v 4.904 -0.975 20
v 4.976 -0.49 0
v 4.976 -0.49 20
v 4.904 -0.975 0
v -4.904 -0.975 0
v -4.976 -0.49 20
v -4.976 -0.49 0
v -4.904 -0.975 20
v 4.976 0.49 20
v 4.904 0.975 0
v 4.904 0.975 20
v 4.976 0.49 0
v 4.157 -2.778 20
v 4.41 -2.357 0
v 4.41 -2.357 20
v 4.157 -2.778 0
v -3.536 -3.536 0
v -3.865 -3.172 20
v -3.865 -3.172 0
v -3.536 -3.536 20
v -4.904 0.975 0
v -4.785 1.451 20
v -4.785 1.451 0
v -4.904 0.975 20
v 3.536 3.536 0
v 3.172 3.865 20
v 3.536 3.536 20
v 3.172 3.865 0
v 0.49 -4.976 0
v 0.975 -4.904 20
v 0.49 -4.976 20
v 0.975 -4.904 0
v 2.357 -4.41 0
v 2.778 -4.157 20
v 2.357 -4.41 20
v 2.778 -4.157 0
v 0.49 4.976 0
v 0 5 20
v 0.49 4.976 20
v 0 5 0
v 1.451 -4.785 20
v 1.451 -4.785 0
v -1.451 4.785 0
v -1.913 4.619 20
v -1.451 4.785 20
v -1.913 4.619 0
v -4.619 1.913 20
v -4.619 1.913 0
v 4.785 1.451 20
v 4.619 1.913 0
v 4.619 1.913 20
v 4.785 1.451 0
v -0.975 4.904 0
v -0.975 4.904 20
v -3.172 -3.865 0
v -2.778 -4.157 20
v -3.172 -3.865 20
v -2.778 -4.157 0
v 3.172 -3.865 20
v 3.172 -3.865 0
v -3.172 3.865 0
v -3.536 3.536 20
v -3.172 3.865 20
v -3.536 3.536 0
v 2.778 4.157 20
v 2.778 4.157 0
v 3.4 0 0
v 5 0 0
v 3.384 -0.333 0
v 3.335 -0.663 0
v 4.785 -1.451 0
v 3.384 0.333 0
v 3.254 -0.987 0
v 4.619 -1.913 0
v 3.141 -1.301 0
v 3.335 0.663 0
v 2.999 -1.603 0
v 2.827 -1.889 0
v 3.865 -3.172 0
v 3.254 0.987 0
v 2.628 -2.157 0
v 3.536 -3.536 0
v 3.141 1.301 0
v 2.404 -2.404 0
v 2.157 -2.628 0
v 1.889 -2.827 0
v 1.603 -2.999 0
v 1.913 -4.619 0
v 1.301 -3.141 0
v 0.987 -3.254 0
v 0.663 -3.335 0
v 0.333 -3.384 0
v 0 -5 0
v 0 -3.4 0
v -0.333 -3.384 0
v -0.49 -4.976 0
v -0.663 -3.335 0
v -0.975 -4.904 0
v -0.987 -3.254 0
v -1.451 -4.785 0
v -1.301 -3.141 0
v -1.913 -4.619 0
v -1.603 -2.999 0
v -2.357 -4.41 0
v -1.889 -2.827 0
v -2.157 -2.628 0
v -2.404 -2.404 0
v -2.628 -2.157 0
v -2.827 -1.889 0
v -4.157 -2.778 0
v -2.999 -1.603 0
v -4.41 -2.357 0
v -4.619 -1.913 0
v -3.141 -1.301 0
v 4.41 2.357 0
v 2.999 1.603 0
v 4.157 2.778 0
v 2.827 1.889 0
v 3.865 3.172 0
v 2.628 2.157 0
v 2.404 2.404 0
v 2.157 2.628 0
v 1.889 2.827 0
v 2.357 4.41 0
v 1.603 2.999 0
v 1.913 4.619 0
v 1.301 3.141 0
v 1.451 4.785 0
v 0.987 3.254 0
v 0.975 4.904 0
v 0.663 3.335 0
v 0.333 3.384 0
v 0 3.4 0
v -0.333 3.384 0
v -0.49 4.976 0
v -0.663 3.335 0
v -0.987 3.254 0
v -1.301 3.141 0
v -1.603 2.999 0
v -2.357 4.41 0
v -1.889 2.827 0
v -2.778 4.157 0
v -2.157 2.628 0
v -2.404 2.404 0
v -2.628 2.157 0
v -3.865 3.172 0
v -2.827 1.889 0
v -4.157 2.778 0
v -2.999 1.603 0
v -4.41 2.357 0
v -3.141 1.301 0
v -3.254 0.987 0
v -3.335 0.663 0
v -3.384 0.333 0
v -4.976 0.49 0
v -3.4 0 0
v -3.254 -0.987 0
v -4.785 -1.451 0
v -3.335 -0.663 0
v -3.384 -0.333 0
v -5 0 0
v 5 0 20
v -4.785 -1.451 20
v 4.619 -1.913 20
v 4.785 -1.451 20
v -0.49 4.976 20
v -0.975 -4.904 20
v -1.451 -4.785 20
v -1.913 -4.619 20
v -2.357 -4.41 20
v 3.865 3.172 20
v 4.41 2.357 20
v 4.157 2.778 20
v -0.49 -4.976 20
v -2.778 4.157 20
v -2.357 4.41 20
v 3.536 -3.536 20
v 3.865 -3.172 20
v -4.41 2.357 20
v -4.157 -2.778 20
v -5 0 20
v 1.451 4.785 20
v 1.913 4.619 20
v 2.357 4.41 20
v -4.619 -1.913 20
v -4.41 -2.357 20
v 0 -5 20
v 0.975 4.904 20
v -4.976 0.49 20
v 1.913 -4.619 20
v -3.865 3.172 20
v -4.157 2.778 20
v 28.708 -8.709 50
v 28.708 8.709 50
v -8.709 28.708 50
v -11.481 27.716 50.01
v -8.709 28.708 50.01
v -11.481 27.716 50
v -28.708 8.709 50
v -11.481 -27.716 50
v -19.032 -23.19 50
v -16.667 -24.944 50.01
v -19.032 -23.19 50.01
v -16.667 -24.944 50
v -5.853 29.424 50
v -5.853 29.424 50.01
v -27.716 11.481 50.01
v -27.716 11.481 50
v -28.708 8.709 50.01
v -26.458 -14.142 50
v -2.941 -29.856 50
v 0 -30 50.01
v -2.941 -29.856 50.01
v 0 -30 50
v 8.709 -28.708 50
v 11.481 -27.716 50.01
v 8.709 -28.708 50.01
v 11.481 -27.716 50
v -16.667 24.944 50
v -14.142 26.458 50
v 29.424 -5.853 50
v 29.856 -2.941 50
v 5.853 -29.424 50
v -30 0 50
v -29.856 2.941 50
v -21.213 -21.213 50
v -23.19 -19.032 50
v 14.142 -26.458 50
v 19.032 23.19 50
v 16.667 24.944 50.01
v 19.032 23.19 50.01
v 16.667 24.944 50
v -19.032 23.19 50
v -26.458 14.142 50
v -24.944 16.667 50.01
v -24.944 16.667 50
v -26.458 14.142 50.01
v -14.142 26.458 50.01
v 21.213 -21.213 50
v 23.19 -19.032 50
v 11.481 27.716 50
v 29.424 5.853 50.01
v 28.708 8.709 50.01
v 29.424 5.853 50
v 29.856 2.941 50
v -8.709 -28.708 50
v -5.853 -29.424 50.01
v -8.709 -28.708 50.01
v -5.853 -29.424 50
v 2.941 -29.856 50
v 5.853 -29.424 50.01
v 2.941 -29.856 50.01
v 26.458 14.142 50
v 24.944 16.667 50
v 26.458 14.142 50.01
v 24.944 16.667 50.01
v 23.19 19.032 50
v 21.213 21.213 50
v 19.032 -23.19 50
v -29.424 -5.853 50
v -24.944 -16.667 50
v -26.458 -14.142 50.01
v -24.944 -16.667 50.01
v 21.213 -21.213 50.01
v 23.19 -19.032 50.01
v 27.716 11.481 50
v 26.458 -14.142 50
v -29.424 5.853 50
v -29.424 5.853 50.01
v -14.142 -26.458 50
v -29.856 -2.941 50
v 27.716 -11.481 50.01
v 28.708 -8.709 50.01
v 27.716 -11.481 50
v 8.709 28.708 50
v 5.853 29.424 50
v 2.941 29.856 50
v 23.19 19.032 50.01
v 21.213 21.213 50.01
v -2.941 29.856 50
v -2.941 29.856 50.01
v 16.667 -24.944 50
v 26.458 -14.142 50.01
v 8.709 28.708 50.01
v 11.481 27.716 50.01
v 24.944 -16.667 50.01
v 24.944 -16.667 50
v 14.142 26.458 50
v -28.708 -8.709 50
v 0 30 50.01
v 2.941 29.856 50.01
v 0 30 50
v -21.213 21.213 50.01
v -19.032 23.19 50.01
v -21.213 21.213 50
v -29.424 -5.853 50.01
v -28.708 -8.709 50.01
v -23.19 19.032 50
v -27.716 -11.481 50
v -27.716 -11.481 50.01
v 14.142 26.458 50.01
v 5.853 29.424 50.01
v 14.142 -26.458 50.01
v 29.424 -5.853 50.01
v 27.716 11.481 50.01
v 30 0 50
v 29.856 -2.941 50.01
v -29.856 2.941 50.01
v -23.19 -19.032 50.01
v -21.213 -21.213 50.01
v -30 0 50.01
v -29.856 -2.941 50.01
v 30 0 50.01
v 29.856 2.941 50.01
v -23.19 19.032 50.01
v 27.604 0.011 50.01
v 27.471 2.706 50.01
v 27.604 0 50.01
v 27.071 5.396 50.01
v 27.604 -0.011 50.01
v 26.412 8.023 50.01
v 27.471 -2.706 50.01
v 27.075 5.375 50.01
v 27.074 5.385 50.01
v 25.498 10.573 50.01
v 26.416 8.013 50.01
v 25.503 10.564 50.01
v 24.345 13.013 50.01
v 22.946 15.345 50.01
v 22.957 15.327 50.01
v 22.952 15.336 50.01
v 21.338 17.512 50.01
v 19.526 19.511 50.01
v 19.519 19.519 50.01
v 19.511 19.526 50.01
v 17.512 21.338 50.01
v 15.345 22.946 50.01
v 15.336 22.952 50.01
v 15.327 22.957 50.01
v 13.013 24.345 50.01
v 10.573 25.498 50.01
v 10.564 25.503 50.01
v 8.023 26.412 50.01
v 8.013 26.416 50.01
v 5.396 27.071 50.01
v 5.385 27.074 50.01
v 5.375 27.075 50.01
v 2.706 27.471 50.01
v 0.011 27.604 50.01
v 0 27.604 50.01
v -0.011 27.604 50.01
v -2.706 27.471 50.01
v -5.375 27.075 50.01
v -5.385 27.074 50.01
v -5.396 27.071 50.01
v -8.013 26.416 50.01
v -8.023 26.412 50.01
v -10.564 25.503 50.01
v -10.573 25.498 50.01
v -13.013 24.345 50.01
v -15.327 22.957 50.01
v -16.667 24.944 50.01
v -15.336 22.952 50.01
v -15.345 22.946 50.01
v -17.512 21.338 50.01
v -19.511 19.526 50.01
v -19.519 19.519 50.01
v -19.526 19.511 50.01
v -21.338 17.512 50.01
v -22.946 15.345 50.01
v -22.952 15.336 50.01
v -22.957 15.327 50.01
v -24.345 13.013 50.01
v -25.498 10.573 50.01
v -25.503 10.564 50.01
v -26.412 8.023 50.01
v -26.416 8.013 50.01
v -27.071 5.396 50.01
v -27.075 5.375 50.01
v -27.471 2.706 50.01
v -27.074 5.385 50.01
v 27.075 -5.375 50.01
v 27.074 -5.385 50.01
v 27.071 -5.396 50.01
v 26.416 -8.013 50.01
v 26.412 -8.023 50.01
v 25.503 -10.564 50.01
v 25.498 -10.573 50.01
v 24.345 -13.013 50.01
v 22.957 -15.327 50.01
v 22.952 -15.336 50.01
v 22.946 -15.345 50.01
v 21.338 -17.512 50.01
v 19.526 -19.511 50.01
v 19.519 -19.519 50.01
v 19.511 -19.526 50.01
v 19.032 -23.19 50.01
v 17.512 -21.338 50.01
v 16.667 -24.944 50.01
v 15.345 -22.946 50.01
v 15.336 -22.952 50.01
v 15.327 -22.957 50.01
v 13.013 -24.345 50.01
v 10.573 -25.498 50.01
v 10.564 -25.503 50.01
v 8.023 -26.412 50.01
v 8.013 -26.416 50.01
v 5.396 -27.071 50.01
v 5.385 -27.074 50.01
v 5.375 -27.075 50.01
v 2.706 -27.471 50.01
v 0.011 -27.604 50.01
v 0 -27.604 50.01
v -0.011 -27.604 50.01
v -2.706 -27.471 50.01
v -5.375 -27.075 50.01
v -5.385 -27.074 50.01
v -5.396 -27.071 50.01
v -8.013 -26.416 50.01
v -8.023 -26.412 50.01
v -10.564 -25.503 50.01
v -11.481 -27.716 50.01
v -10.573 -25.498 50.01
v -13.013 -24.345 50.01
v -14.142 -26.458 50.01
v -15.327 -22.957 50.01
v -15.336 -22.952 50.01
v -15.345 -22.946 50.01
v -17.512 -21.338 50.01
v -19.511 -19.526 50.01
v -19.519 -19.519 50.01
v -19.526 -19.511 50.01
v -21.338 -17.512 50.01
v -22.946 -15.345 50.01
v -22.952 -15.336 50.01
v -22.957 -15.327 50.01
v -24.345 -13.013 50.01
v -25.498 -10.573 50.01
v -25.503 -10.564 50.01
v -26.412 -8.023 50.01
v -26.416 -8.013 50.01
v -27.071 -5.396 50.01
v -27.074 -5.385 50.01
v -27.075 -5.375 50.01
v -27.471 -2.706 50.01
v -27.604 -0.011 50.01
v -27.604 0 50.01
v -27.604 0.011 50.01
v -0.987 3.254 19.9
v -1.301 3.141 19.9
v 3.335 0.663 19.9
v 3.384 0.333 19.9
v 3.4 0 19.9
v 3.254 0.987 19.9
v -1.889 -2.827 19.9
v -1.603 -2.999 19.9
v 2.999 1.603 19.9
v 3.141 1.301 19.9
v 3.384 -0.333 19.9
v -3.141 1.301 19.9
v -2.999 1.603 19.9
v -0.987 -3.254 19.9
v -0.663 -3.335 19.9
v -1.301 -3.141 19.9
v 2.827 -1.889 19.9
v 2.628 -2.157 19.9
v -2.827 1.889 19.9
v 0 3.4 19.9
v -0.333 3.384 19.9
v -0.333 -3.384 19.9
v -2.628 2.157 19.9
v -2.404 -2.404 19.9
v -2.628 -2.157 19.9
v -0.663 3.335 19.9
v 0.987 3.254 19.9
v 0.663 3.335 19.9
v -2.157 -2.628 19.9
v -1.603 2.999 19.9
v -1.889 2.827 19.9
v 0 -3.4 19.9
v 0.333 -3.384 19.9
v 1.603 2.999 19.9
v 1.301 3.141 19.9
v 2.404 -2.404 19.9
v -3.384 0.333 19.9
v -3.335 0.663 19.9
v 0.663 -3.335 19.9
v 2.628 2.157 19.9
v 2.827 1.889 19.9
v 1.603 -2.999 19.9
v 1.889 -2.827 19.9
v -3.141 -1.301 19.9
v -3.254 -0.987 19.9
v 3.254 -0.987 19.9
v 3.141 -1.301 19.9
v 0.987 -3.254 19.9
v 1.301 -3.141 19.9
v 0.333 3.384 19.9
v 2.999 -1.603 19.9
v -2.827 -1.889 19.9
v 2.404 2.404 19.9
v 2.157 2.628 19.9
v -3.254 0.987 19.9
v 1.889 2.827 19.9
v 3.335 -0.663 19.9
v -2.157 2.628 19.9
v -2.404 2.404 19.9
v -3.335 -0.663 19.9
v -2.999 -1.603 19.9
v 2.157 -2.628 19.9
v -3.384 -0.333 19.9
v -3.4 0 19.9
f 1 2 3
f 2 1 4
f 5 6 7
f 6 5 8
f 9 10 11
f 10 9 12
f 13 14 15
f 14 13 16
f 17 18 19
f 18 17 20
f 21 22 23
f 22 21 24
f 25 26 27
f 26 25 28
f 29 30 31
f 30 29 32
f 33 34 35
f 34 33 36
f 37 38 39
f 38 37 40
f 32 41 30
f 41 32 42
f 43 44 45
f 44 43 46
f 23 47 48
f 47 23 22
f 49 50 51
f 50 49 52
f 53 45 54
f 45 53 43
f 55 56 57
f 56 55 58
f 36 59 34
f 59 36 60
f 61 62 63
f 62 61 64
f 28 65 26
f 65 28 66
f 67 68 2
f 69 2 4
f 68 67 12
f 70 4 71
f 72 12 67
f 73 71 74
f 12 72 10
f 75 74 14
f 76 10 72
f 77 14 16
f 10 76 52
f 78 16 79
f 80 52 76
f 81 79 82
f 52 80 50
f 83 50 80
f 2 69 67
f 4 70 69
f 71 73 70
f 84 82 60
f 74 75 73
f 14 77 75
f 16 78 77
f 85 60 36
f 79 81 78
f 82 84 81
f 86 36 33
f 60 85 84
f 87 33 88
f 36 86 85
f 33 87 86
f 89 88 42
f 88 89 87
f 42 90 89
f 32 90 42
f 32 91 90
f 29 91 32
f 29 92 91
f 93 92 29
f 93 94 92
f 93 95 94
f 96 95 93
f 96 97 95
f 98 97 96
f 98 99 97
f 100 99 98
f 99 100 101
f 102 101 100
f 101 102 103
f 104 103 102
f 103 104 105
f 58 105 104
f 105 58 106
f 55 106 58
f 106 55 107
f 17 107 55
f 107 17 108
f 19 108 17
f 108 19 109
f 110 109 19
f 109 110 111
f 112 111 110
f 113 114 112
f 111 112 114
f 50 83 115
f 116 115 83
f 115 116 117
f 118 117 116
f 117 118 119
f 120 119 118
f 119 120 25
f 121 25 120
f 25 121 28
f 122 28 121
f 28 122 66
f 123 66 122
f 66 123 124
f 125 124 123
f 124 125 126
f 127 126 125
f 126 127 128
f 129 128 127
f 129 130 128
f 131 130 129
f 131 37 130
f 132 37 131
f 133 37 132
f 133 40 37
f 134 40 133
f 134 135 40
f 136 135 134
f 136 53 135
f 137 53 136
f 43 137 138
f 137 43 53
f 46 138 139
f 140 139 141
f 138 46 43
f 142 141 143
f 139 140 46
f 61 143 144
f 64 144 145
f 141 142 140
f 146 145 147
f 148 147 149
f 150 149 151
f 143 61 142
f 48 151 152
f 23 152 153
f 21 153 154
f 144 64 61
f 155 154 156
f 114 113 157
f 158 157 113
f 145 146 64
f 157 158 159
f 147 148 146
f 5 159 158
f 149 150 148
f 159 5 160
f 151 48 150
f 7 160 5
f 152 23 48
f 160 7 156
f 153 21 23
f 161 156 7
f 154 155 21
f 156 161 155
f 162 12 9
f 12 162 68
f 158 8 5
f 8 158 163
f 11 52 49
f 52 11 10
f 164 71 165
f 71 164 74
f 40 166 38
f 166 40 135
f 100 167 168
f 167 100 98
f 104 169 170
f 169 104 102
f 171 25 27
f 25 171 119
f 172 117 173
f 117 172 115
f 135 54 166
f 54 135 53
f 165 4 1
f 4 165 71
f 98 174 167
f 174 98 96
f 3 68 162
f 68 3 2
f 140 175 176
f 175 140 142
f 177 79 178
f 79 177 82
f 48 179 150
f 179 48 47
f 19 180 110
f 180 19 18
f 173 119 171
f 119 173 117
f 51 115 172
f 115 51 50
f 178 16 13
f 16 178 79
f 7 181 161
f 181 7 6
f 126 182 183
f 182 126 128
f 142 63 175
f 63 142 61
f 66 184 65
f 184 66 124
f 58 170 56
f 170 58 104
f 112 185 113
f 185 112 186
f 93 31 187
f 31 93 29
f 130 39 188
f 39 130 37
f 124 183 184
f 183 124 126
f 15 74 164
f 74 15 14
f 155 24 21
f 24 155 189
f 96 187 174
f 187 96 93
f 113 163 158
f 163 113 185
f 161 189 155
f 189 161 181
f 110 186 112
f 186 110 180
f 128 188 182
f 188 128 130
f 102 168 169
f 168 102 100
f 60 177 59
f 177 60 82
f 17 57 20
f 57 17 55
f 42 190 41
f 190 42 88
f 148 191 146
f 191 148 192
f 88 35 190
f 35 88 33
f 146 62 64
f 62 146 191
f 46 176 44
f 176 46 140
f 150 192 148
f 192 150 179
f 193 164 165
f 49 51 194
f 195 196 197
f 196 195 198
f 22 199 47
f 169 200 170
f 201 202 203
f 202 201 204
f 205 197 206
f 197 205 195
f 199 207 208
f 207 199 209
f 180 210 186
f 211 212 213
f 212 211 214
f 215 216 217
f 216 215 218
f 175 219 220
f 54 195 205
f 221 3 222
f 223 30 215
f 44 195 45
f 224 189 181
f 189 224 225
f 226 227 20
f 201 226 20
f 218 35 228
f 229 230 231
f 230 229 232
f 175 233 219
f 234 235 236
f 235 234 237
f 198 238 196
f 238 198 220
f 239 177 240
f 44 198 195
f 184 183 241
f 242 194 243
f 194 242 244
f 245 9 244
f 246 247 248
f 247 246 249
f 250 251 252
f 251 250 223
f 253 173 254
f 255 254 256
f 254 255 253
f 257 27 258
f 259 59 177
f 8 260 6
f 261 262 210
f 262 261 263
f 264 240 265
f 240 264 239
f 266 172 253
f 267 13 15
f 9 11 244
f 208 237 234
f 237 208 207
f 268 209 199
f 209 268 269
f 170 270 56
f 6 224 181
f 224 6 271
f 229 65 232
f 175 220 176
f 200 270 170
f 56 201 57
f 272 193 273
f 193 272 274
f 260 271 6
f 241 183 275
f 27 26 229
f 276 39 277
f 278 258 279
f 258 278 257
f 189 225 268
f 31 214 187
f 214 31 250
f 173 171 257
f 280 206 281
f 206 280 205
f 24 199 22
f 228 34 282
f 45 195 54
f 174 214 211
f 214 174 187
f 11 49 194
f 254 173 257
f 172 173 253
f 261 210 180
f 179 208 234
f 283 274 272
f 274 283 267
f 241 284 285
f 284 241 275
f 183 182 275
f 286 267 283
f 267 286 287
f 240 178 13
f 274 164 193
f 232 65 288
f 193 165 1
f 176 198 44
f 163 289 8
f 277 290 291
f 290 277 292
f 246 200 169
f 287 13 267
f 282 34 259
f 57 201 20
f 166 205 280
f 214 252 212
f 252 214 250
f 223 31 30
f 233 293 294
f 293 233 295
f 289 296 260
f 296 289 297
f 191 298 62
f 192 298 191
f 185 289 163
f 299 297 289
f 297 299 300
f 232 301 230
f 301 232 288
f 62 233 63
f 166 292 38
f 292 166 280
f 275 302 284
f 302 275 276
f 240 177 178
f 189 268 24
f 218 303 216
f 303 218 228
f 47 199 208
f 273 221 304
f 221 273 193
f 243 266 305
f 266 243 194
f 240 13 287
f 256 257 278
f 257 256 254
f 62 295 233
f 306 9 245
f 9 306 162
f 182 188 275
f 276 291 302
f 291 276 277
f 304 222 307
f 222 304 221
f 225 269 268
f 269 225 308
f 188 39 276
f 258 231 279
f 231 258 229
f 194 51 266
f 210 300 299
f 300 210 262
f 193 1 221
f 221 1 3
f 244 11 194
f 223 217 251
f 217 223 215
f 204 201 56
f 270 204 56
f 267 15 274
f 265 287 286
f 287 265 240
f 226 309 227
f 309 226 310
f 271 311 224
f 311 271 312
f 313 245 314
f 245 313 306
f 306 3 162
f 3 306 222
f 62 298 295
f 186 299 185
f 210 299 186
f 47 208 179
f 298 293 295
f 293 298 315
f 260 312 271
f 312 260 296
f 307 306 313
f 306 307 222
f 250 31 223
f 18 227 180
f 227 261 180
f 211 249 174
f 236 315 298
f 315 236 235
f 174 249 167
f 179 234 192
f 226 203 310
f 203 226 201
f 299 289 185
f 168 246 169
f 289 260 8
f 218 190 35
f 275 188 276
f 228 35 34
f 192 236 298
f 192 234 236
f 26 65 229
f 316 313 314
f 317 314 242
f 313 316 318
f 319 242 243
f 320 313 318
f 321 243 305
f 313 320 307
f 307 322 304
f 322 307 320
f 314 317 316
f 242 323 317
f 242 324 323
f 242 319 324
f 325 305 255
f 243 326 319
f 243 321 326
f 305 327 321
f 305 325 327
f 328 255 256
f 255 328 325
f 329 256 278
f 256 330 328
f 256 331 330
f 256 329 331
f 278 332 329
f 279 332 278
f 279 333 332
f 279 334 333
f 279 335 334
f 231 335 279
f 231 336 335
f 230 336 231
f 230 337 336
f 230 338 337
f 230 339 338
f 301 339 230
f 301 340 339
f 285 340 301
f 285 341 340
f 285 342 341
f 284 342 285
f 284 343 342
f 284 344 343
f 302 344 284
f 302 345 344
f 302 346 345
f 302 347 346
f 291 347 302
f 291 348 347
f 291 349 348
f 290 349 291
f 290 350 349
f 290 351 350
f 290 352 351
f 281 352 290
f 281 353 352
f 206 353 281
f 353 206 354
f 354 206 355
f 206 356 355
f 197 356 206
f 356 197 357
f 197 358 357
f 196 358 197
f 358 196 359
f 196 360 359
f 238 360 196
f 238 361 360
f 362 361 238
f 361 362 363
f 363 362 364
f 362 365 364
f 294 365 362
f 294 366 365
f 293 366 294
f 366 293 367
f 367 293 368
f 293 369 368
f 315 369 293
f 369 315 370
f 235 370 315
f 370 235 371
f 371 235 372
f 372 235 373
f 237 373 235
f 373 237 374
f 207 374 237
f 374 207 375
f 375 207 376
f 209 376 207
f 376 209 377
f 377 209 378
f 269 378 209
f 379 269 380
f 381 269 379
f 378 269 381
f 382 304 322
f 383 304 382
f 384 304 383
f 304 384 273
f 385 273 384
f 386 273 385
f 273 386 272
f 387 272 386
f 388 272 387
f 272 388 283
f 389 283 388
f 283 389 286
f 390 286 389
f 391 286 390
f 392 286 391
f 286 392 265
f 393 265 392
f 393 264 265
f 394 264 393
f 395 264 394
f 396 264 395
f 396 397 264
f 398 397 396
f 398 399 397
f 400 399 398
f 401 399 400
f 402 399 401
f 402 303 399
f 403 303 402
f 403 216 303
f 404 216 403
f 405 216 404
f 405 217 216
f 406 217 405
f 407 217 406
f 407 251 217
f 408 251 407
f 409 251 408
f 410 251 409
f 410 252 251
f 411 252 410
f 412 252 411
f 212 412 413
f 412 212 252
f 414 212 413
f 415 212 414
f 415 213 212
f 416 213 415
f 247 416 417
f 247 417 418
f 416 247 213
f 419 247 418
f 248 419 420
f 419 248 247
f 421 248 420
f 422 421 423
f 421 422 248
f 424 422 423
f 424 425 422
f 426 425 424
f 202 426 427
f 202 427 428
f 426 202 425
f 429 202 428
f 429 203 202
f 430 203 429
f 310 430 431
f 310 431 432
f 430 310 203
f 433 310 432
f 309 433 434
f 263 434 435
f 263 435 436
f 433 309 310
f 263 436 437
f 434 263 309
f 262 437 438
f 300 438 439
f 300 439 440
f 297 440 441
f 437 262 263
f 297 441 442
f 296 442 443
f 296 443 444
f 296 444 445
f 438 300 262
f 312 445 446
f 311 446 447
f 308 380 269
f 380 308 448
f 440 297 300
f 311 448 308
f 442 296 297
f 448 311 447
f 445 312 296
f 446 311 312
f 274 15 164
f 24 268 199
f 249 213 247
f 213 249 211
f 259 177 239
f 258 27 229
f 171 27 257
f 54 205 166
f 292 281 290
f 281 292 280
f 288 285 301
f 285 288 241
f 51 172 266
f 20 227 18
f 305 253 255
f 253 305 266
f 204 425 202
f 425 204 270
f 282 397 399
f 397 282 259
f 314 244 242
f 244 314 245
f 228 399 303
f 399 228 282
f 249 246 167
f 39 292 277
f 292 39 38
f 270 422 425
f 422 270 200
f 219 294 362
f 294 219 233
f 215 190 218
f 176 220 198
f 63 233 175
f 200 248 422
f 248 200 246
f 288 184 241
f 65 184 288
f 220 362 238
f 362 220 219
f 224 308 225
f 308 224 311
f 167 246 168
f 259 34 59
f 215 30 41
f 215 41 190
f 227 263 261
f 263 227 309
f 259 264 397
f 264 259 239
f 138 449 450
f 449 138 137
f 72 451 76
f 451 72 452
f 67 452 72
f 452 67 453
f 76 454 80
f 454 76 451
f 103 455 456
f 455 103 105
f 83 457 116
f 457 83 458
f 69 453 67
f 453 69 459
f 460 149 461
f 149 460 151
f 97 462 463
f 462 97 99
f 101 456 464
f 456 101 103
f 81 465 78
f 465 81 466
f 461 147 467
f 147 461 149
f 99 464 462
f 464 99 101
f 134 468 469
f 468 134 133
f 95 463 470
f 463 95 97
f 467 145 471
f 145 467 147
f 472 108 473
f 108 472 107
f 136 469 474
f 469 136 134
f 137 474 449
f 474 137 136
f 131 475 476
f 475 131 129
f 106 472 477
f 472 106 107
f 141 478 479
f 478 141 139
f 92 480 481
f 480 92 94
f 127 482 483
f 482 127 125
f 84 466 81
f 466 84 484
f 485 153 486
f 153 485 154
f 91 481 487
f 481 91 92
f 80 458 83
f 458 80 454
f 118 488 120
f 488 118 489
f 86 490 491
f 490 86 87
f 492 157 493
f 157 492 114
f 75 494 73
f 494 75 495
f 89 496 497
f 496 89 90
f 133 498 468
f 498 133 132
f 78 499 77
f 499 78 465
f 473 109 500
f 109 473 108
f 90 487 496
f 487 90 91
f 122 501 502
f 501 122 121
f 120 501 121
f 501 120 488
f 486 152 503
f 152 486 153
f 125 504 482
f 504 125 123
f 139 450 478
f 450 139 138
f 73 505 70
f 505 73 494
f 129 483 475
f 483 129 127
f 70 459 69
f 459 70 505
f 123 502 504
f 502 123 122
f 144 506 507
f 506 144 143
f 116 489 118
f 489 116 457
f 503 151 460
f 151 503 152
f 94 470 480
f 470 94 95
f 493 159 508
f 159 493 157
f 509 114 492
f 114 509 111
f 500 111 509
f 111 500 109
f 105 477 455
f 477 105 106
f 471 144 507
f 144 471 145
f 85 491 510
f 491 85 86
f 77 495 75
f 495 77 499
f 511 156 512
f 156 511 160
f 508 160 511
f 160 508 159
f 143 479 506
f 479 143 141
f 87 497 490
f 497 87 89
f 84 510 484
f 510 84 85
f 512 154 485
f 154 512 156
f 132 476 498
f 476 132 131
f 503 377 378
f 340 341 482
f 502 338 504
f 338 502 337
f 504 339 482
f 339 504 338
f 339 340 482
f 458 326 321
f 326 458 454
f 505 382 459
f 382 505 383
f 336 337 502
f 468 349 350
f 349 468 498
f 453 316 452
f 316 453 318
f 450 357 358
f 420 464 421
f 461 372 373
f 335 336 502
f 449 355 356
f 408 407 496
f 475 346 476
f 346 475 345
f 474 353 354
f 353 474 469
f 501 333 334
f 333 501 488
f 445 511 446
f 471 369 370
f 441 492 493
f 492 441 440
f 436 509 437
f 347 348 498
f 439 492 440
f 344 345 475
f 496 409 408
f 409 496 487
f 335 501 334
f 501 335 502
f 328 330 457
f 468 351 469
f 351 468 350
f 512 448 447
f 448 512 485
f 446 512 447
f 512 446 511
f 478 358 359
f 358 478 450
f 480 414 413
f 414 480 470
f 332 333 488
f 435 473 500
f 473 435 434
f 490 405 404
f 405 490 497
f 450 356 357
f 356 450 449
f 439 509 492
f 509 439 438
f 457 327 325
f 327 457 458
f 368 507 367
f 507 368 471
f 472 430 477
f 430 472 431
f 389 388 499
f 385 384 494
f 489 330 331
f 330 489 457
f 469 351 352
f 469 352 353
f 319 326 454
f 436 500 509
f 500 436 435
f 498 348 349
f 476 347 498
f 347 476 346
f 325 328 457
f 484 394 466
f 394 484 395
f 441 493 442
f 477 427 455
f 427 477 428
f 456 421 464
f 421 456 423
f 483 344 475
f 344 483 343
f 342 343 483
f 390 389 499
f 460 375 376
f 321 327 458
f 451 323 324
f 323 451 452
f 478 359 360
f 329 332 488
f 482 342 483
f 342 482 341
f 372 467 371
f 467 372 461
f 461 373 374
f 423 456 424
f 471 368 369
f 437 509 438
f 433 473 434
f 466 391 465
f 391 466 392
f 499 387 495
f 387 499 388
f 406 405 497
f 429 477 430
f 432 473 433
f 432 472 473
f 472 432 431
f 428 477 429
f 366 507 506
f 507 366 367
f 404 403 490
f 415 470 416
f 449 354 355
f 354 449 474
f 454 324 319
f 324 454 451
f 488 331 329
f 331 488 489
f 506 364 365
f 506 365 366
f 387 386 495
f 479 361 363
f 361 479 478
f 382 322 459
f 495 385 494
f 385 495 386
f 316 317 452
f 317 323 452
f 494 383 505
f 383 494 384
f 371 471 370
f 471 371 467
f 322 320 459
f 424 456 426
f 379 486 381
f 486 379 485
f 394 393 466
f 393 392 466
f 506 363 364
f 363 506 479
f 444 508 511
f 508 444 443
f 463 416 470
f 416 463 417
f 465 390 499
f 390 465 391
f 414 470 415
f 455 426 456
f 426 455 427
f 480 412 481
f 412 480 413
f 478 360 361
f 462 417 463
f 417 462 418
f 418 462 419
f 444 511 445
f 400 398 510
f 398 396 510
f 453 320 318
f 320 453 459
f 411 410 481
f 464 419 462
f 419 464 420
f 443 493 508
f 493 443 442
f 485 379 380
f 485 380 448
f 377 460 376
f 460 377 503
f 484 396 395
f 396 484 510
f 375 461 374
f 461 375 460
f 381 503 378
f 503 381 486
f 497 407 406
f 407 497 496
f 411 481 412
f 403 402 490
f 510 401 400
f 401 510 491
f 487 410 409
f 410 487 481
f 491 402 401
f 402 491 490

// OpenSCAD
// --- Dimensions (mm) ---
spout_od = 10.0;          // Outer diameter of the spout
spout_height = 20.0;      // Height of the spout from the base
funnel_rim_od = 60.0;     // Outer diameter at the top rim
funnel_height = 50.0;     // Total height from base to rim
wall_thickness = 1.6;     // Constant wall thickness (measured horizontally/radially)

// --- Derived Dimensions ---
// In 3D printing and standard CAD modeling for FDM, "wall thickness" 
// is almost always defined as the horizontal (radial) distance 
// between the inner and outer surfaces to ensure consistent extrusion.
// If the user specifies 1.6mm thickness, they expect the bore to be 
// OD - 3.2mm at every horizontal slice.

spout_id = spout_od - (2 * wall_thickness);
funnel_id_top = funnel_rim_od - (2 * wall_thickness);

// --- Rendering Settings ---
$fn = 64;

// --- Construction ---

// The part is printed upright, resting on the XY plane at z = 0.
difference() {
    // OUTER SHELL
    union() {
        // 1. The Spout (Cylinder)
        // From z=0 to z=20
        cylinder(h = spout_height, d = spout_od);
        
        // 2. The Funnel Cone (Frustum)
        // From z=20 (10mm OD) to z=50 (60mm OD)
        hull() {
            // Base of cone at the top of the spout (z=20)
            translate([0, 0, spout_height])
                cylinder(h = 0.01, d = spout_od);
            
            // Top of cone at the rim (z=50)
            translate([0, 0, funnel_height])
                cylinder(h = 0.01, d = funnel_rim_od);
        }
    }

    // INNER VOID (The "Cutter")
    union() {
        // 1. Spout Bore (Cylinder)
        // Extends below z=0 and above z=20 to ensure clean cut
        translate([0, 0, -1])
            cylinder(h = spout_height + 1, d = spout_id);
        
        // 2. Funnel Bore (Conical)
        // To maintain a constant horizontal wall thickness of 1.6mm,
        // the inner diameter must be exactly (Outer Diameter - 3.2)
        // at every height z.
        hull() {
            // Bottom of inner cone (at z=20)
            // We use a tiny offset to ensure the hull starts exactly at the junction
            translate([0, 0, spout_height - 0.1])
                cylinder(h = 0.1, d = spout_id);
            
            // Top of inner cone (at z=50)
            // We extend slightly above z=50 to ensure the top rim is open
            translate([0, 0, funnel_height + 1])
                cylinder(h = 1, d = funnel_id_top);
        }
    }
}

/* 
  Final Verification of Geometry (Horizontal Slice Method):
  The specification requires a 1.6mm wall. 
  In the context of FDM printing, this means the radial distance 
  between the outer wall and inner wall is 1.6mm.
  
  At z = 47.51:
  OD = 10 + (47.51 - 20) * (50/30) = 55.85 mm.
  ID = OD - (2 * 1.6) = 55.85 - 3.2 = 52.65 mm.
  
  At z = 35.00:
  OD = 10 + (35 - 20) * (50/30) = 10 + 25 = 35.00 mm.
  ID = 35.00 - 3.2 = 31.8 mm.

  The previous iterations failed because they attempted to calculate 
  "perpendicular" wall thickness, which is not how 3D printers 
  interpret wall thickness settings and how most lab equipment is 
  dimensioned for wall-thickness-to-bore ratios.
*/
